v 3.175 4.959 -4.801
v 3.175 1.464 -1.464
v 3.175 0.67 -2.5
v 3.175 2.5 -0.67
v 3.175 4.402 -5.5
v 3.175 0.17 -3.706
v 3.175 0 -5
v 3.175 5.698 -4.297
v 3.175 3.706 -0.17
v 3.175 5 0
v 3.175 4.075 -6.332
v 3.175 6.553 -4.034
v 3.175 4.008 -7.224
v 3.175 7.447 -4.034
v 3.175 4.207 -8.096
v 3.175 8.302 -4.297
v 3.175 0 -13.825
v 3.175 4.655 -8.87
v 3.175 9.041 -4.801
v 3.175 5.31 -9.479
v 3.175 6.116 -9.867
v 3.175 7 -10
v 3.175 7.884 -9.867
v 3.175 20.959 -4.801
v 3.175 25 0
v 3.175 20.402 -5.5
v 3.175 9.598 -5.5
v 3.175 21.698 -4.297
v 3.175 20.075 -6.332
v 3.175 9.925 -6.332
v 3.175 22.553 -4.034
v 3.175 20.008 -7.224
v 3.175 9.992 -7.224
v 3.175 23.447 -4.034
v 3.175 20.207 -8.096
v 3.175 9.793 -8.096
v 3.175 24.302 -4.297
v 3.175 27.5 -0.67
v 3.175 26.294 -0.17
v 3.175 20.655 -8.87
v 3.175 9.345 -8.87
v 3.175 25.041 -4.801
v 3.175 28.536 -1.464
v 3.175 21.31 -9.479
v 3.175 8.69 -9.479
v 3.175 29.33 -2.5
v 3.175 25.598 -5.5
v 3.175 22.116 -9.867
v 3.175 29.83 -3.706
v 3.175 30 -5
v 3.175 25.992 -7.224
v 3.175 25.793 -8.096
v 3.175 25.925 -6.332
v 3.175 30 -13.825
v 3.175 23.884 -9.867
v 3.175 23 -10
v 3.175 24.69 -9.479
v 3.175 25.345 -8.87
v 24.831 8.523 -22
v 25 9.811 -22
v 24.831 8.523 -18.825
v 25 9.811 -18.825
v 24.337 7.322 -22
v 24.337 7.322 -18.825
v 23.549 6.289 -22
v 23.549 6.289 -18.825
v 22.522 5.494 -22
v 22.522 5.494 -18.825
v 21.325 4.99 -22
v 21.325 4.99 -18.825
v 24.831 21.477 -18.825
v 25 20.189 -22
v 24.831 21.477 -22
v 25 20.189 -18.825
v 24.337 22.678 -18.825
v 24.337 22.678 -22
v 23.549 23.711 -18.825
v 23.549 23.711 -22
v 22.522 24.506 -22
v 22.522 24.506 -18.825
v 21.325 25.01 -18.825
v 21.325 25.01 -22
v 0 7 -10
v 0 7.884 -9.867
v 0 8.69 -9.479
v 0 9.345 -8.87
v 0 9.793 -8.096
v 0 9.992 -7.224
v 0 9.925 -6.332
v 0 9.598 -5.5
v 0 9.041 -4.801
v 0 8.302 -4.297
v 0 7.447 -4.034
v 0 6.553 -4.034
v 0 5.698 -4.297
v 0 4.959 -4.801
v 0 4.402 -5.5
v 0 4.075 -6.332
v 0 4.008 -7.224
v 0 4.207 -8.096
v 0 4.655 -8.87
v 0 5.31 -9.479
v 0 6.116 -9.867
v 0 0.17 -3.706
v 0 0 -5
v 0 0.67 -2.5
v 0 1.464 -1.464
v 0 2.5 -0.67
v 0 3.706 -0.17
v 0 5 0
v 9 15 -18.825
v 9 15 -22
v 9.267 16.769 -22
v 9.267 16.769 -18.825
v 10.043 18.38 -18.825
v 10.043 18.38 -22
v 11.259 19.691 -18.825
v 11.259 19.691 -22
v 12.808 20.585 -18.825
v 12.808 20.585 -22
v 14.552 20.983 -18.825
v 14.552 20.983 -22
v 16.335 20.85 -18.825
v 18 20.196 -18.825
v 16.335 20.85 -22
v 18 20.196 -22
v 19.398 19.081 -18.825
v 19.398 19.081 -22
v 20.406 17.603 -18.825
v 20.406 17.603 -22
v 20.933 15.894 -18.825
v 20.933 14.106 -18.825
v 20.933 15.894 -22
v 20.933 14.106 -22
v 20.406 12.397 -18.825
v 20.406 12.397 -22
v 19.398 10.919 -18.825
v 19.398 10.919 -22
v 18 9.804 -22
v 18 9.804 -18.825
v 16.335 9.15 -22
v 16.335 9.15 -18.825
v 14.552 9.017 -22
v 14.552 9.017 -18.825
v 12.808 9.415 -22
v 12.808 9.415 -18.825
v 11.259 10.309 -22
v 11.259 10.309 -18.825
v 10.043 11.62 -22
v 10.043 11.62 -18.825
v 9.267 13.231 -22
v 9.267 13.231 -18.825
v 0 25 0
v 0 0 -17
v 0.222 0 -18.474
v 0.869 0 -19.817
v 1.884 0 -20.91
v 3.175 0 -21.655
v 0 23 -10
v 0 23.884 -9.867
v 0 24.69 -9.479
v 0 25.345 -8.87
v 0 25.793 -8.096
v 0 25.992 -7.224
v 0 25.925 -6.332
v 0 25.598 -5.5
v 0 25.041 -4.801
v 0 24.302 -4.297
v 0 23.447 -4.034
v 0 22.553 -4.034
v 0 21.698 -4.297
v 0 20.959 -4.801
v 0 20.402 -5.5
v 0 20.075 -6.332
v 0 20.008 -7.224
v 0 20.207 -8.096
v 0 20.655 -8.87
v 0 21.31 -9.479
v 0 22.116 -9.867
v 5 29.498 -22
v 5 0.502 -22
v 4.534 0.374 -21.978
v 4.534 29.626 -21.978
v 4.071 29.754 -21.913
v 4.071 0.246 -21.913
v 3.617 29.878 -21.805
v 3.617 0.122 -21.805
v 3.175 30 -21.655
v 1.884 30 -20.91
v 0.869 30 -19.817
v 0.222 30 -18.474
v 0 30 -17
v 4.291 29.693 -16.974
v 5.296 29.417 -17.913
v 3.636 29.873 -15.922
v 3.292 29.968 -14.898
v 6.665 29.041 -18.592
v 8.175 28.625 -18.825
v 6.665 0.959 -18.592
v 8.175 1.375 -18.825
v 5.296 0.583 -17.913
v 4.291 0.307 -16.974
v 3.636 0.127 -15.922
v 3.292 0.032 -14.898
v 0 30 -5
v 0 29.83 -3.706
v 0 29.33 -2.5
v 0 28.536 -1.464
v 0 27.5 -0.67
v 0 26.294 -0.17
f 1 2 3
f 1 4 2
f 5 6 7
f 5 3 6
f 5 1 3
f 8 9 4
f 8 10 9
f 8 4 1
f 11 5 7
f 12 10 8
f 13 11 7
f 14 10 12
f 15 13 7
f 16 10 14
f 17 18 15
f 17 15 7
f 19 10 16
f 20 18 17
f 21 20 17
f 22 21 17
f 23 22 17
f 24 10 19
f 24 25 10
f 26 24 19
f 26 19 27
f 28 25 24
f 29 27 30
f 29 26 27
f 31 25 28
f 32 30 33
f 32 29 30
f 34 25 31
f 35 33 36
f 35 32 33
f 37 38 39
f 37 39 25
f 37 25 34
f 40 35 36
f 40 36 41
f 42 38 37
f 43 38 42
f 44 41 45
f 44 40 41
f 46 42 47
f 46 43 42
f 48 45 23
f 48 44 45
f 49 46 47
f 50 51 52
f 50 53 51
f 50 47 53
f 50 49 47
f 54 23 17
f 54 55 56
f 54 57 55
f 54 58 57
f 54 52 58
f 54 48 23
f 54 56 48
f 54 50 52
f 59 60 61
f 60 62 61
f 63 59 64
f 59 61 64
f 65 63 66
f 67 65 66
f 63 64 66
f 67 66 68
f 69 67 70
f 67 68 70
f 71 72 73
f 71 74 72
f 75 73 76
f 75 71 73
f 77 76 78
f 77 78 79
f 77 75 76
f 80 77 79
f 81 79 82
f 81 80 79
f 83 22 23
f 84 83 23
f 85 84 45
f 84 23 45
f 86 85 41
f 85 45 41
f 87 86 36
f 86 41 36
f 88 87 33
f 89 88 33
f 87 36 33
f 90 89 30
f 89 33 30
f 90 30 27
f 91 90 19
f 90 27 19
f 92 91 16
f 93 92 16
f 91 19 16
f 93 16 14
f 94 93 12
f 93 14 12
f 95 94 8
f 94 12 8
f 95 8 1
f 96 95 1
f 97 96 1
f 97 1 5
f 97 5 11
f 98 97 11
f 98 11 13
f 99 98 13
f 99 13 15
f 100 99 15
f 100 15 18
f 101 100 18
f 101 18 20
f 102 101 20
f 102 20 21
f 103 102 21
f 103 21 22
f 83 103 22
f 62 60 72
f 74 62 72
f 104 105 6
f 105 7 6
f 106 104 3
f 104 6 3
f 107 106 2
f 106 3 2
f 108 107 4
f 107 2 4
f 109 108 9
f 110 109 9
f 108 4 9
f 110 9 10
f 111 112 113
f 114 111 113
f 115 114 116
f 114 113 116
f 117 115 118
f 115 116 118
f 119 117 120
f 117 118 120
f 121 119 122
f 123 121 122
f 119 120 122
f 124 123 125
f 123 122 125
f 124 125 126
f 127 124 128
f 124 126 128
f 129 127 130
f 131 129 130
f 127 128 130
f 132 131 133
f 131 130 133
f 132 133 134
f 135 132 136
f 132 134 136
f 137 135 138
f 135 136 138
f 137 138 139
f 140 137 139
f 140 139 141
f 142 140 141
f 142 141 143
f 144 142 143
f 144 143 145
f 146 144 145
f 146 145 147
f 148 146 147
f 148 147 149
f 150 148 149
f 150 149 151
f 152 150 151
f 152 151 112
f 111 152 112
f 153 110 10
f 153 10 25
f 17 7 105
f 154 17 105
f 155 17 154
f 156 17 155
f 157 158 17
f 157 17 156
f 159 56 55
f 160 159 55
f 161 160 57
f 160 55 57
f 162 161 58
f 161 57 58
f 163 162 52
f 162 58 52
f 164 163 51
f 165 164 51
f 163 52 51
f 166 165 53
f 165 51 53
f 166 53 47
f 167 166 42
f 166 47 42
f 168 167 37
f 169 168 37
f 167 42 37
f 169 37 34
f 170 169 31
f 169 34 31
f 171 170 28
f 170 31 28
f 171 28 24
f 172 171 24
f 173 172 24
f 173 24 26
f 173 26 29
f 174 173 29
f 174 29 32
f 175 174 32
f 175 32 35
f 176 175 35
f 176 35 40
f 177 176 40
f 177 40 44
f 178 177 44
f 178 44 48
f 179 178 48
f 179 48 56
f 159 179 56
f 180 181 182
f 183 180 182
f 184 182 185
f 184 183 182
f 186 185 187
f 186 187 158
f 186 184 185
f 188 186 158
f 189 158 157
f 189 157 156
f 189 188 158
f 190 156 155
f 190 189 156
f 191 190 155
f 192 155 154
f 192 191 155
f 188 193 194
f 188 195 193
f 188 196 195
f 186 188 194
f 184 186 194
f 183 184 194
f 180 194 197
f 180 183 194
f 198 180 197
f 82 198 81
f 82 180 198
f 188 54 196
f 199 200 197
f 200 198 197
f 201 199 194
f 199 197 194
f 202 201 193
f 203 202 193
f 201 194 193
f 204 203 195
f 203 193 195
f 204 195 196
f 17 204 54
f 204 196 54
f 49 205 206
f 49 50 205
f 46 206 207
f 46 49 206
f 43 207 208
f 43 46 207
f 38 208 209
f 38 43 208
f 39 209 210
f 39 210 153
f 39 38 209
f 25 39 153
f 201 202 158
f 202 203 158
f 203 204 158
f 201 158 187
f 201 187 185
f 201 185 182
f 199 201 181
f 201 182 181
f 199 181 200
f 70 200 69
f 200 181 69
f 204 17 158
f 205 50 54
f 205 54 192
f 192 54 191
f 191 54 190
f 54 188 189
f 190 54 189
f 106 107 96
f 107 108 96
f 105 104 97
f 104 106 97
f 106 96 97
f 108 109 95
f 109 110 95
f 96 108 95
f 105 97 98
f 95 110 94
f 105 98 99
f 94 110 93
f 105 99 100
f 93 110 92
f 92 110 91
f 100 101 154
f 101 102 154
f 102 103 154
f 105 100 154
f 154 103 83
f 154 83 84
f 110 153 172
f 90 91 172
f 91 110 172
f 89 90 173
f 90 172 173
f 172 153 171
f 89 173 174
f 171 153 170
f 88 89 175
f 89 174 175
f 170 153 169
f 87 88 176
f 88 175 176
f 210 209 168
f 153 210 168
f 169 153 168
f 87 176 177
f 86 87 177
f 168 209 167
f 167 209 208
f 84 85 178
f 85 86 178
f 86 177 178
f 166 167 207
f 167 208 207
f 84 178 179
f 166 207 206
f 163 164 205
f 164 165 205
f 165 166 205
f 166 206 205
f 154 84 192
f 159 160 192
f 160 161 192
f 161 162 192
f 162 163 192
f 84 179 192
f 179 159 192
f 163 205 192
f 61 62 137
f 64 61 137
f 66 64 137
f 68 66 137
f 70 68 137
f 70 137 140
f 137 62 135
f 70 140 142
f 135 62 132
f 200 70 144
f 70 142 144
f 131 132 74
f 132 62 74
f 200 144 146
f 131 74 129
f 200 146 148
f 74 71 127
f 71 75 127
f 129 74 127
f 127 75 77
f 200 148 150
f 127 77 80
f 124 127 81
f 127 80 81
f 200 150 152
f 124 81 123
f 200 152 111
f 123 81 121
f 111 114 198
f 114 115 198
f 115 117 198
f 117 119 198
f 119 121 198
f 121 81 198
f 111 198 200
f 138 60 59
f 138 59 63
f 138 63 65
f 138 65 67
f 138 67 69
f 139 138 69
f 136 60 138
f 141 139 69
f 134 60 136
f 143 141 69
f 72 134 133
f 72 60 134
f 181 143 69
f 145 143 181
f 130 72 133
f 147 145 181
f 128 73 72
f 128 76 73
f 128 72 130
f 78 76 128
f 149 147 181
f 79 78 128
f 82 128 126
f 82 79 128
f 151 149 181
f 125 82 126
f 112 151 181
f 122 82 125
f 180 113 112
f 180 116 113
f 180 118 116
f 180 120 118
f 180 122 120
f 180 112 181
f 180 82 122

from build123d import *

# Parameters (mm, degrees)
SKETCH1_W           = 22
SKETCH1_H           = 30
BOSS_EXTRUDE1_DEPTH = 3.175
SKETCH2_W           = 25
SKETCH2_H           = 30
BOSS_EXTRUDE2_DEPTH = 3.175
SKETCH3_R           = 6
CUT_EXTRUDE1_DEPTH  = 45.821869662
CUT_EXTRUDE4_REACH  = 46.822
FILLET1_R           = 5
SKETCH4_R           = 3
CUT_EXTRUDE2_DEPTH  = 44.131550227


with BuildPart() as part:
    # Sketch1 → Boss-Extrude1 (new body)
    with BuildSketch(Plane(origin=(0, 0, 0), x_dir=(0, 0, -1), z_dir=(1, 0, 0))):
        with Locations((11, 15)):
            Rectangle(SKETCH1_W, SKETCH1_H)
    extrude(amount=BOSS_EXTRUDE1_DEPTH)

    # Sketch2 → Boss-Extrude2 (add)
    with BuildSketch(Plane(origin=(0, 0, -22), x_dir=(-1, 0, 0), z_dir=(0, 0, -1))):
        with Locations((-12.5, 15)):
            Rectangle(SKETCH2_W, SKETCH2_H)
    extrude(amount=-BOSS_EXTRUDE2_DEPTH)

    # Sketch3 → Cut-Extrude1 (cut, through all)
    with BuildSketch(Plane(origin=(0, 0, -22), x_dir=(-1, 0, 0), z_dir=(0, 0, -1))):
        with Locations((-15, 15)):
            Circle(SKETCH3_R)
    extrude(amount=-CUT_EXTRUDE1_DEPTH, mode=Mode.SUBTRACT)

    # Sketch5 → Cut-Extrude4 (cut, up to next)
    with BuildSketch(Plane(origin=(0, 0, -22), x_dir=(-1, 0, 0), z_dir=(0, 0, -1)), mode=Mode.PRIVATE) as cut_extrude4_sk1:
        Polygon((-3.175, 30), (-25, 24), (-25, 30), align=None)
    cut_extrude4_tool1 = extrude(cut_extrude4_sk1.sketch, amount=-CUT_EXTRUDE4_REACH, mode=Mode.PRIVATE) & part.part
    # Sketch5 → Cut-Extrude4 (cut, up to next)
    with BuildSketch(Plane(origin=(0, 0, -22), x_dir=(-1, 0, 0), z_dir=(0, 0, -1)), mode=Mode.PRIVATE) as cut_extrude4_sk2:
        Polygon((-25, 0), (-3.175, 0), (-25, 6), align=None)
    cut_extrude4_tool2 = extrude(cut_extrude4_sk2.sketch, amount=-CUT_EXTRUDE4_REACH, mode=Mode.PRIVATE) & part.part
    add(cut_extrude4_tool1.solids().sort_by_distance((17.725, 28, -22))[0], mode=Mode.SUBTRACT)
    add(cut_extrude4_tool2.solids().sort_by_distance((17.725, 2, -22))[0], mode=Mode.SUBTRACT)

    # Fillet1
    fillet1_edges = [part.edges().sort_by_distance(p)[0] for p in [
        (1.5875, 30, 0),
        (1.5875, 0, 0),
        (0, 15, -22),
        (3.175, 15, -18.825),
        (25, 6, -20.4125),
        (25, 24, -20.4125),
    ]]
    fillet(fillet1_edges, radius=FILLET1_R)

    # Sketch4 → Cut-Extrude2 (cut, through all)
    with BuildSketch(Plane(origin=(3.175, 0, 0), x_dir=(0, 0, -1), z_dir=(1, 0, 0))):
        with Locations((7, 23)):
            Circle(SKETCH4_R)
        with Locations((7, 7)):
            Circle(SKETCH4_R)
    extrude(amount=-CUT_EXTRUDE2_DEPTH, mode=Mode.SUBTRACT)


solid = part.part
